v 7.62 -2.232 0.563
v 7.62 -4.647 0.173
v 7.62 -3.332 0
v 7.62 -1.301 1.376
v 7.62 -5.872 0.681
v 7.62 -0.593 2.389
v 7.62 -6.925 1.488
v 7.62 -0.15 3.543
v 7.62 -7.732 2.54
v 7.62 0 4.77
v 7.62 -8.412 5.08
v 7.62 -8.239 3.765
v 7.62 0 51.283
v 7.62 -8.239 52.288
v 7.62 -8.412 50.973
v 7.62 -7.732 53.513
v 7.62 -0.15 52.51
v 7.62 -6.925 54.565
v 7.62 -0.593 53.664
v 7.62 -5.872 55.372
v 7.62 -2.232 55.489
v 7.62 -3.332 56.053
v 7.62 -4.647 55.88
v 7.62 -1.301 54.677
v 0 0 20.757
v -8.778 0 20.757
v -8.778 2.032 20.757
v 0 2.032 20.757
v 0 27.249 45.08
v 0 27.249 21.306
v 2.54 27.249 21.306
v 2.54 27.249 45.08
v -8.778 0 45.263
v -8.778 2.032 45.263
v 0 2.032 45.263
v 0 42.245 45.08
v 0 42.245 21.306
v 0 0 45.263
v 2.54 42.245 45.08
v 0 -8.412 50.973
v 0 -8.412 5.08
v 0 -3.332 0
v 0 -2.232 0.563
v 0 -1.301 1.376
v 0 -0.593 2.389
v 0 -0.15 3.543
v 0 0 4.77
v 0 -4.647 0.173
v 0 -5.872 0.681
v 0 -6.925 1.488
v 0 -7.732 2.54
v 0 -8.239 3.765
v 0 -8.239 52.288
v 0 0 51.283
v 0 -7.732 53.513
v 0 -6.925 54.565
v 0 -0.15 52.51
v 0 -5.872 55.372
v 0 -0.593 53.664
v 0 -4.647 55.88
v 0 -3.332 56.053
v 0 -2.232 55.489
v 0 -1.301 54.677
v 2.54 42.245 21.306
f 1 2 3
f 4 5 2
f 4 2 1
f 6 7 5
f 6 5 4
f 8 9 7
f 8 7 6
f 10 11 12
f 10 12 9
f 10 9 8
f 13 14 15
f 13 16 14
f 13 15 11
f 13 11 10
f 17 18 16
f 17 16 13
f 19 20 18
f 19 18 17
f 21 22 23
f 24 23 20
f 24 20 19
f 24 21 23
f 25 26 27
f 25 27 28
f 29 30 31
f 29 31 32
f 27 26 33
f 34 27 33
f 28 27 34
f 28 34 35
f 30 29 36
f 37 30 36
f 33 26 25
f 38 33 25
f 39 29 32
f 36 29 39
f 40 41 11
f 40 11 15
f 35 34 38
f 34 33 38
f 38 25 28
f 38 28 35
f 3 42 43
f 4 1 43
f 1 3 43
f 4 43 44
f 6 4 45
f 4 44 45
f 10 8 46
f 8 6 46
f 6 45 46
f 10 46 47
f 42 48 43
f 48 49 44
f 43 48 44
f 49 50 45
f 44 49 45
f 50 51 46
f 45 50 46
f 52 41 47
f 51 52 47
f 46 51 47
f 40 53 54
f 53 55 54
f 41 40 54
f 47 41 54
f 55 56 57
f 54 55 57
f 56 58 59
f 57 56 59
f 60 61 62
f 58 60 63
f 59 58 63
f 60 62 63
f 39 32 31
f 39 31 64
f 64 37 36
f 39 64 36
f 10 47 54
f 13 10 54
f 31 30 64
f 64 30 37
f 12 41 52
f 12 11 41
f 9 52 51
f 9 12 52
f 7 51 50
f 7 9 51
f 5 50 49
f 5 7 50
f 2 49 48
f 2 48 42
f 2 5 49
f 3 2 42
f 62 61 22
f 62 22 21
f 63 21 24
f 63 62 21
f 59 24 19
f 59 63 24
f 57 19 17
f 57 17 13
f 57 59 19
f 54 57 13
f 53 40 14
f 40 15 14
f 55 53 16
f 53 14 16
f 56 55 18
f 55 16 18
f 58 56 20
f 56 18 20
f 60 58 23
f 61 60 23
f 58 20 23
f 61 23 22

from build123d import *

# Parameters (mm, degrees)
F0_W        = 8.412479423
F0_H        = 56.0527183115
F1_DEPTH    = 7.62
F2_R        = 5.08
F3_T1_DEPTH = 31.4698280041
F4_R        = 5.08
F5_T1_DEPTH = 31.4698280041
F6_W        = 14.9961616844
F6_H        = 23.7744003534
F7_DEPTH    = 2.54
F8_W        = 8.7782405317
F8_H        = 24.5059225708
F9_DEPTH    = 1.016
F10_DEPTH   = 1.016


# Not quite as in the source:
# - a fillet or chamfer that OpenCascade refuses, or shapes differently, is made with other operations: its cross-section is extruded or revolved along the edge and cut away or added


with BuildPart() as f1:
    # F0 (on Right) → F1 (new body)
    with BuildSketch(Plane.YZ):
        with Locations((-4.2062397115, 28.0263591558)):
            Rectangle(F0_W, F0_H)
    extrude(amount=F1_DEPTH)

    # F2
    f2_edges = [f1.edges().sort_by_distance(p)[0] for p in [
        (3.81, -8.412479, 56.052718),
    ]]
    fillet(f2_edges, radius=F2_R)

    # F3: fillet of radius 5.08 on 1 edges, made by hand

    # F3_s2 → F3_t1 (cut)
    with BuildSketch(Plane.YZ.offset(-11.924914002)):
        with BuildLine():
            ThreePointArc((-3.332479423, 56.0527183115), (-0.9156390327, 54.1921336989), (0, 51.2827527107))
            Line((0, 51.2827527107), (0, 56.0527183115))
            Line((0, 56.0527183115), (-3.332479423, 56.0527183115))
        make_face()
    extrude(amount=F3_T1_DEPTH, mode=Mode.SUBTRACT)

    # F4
    f4_edges = [f1.edges().sort_by_distance(p)[0] for p in [
        (3.81, -8.412479, 0),
    ]]
    fillet(f4_edges, radius=F4_R)

    # F5: fillet of radius 5.08 on 1 edges, made by hand

    # F5_s2 → F5_t1 (cut)
    with BuildSketch(Plane.YZ.offset(-11.924914002)):
        with BuildLine():
            ThreePointArc((-3.332479423, 0), (-0.9156390327, 1.8605846126), (0, 4.7699656008))
            Line((0, 4.7699656008), (0, 0))
            Line((0, 0), (-3.332479423, 0))
        make_face()
    extrude(amount=F5_T1_DEPTH, mode=Mode.SUBTRACT)


with BuildPart() as f7:
    # F6 (on Right) → F7 (new body)
    with BuildSketch(Plane.YZ):
        with Locations((34.7471991554, 33.1927202642)):
            Rectangle(F6_W, F6_H)
    extrude(amount=F7_DEPTH)


with BuildPart() as f9:
    # F8 (on Front) → F9 (new body)
    with BuildSketch(Plane.XZ):
        with Locations((-4.3891202658, 33.0098411068)):
            Rectangle(F8_W, F8_H)
    extrude(amount=-F9_DEPTH)

    # F10 (add): a face of the model
    f10_faces = [f9.faces().sort_by_distance(p)[0] for p in [
        (-4.3891202658, 1.016, 33.0098411068),
    ]]
    extrude(f10_faces, amount=F10_DEPTH)


solid = Compound([f1.part, f7.part, f9.part])
